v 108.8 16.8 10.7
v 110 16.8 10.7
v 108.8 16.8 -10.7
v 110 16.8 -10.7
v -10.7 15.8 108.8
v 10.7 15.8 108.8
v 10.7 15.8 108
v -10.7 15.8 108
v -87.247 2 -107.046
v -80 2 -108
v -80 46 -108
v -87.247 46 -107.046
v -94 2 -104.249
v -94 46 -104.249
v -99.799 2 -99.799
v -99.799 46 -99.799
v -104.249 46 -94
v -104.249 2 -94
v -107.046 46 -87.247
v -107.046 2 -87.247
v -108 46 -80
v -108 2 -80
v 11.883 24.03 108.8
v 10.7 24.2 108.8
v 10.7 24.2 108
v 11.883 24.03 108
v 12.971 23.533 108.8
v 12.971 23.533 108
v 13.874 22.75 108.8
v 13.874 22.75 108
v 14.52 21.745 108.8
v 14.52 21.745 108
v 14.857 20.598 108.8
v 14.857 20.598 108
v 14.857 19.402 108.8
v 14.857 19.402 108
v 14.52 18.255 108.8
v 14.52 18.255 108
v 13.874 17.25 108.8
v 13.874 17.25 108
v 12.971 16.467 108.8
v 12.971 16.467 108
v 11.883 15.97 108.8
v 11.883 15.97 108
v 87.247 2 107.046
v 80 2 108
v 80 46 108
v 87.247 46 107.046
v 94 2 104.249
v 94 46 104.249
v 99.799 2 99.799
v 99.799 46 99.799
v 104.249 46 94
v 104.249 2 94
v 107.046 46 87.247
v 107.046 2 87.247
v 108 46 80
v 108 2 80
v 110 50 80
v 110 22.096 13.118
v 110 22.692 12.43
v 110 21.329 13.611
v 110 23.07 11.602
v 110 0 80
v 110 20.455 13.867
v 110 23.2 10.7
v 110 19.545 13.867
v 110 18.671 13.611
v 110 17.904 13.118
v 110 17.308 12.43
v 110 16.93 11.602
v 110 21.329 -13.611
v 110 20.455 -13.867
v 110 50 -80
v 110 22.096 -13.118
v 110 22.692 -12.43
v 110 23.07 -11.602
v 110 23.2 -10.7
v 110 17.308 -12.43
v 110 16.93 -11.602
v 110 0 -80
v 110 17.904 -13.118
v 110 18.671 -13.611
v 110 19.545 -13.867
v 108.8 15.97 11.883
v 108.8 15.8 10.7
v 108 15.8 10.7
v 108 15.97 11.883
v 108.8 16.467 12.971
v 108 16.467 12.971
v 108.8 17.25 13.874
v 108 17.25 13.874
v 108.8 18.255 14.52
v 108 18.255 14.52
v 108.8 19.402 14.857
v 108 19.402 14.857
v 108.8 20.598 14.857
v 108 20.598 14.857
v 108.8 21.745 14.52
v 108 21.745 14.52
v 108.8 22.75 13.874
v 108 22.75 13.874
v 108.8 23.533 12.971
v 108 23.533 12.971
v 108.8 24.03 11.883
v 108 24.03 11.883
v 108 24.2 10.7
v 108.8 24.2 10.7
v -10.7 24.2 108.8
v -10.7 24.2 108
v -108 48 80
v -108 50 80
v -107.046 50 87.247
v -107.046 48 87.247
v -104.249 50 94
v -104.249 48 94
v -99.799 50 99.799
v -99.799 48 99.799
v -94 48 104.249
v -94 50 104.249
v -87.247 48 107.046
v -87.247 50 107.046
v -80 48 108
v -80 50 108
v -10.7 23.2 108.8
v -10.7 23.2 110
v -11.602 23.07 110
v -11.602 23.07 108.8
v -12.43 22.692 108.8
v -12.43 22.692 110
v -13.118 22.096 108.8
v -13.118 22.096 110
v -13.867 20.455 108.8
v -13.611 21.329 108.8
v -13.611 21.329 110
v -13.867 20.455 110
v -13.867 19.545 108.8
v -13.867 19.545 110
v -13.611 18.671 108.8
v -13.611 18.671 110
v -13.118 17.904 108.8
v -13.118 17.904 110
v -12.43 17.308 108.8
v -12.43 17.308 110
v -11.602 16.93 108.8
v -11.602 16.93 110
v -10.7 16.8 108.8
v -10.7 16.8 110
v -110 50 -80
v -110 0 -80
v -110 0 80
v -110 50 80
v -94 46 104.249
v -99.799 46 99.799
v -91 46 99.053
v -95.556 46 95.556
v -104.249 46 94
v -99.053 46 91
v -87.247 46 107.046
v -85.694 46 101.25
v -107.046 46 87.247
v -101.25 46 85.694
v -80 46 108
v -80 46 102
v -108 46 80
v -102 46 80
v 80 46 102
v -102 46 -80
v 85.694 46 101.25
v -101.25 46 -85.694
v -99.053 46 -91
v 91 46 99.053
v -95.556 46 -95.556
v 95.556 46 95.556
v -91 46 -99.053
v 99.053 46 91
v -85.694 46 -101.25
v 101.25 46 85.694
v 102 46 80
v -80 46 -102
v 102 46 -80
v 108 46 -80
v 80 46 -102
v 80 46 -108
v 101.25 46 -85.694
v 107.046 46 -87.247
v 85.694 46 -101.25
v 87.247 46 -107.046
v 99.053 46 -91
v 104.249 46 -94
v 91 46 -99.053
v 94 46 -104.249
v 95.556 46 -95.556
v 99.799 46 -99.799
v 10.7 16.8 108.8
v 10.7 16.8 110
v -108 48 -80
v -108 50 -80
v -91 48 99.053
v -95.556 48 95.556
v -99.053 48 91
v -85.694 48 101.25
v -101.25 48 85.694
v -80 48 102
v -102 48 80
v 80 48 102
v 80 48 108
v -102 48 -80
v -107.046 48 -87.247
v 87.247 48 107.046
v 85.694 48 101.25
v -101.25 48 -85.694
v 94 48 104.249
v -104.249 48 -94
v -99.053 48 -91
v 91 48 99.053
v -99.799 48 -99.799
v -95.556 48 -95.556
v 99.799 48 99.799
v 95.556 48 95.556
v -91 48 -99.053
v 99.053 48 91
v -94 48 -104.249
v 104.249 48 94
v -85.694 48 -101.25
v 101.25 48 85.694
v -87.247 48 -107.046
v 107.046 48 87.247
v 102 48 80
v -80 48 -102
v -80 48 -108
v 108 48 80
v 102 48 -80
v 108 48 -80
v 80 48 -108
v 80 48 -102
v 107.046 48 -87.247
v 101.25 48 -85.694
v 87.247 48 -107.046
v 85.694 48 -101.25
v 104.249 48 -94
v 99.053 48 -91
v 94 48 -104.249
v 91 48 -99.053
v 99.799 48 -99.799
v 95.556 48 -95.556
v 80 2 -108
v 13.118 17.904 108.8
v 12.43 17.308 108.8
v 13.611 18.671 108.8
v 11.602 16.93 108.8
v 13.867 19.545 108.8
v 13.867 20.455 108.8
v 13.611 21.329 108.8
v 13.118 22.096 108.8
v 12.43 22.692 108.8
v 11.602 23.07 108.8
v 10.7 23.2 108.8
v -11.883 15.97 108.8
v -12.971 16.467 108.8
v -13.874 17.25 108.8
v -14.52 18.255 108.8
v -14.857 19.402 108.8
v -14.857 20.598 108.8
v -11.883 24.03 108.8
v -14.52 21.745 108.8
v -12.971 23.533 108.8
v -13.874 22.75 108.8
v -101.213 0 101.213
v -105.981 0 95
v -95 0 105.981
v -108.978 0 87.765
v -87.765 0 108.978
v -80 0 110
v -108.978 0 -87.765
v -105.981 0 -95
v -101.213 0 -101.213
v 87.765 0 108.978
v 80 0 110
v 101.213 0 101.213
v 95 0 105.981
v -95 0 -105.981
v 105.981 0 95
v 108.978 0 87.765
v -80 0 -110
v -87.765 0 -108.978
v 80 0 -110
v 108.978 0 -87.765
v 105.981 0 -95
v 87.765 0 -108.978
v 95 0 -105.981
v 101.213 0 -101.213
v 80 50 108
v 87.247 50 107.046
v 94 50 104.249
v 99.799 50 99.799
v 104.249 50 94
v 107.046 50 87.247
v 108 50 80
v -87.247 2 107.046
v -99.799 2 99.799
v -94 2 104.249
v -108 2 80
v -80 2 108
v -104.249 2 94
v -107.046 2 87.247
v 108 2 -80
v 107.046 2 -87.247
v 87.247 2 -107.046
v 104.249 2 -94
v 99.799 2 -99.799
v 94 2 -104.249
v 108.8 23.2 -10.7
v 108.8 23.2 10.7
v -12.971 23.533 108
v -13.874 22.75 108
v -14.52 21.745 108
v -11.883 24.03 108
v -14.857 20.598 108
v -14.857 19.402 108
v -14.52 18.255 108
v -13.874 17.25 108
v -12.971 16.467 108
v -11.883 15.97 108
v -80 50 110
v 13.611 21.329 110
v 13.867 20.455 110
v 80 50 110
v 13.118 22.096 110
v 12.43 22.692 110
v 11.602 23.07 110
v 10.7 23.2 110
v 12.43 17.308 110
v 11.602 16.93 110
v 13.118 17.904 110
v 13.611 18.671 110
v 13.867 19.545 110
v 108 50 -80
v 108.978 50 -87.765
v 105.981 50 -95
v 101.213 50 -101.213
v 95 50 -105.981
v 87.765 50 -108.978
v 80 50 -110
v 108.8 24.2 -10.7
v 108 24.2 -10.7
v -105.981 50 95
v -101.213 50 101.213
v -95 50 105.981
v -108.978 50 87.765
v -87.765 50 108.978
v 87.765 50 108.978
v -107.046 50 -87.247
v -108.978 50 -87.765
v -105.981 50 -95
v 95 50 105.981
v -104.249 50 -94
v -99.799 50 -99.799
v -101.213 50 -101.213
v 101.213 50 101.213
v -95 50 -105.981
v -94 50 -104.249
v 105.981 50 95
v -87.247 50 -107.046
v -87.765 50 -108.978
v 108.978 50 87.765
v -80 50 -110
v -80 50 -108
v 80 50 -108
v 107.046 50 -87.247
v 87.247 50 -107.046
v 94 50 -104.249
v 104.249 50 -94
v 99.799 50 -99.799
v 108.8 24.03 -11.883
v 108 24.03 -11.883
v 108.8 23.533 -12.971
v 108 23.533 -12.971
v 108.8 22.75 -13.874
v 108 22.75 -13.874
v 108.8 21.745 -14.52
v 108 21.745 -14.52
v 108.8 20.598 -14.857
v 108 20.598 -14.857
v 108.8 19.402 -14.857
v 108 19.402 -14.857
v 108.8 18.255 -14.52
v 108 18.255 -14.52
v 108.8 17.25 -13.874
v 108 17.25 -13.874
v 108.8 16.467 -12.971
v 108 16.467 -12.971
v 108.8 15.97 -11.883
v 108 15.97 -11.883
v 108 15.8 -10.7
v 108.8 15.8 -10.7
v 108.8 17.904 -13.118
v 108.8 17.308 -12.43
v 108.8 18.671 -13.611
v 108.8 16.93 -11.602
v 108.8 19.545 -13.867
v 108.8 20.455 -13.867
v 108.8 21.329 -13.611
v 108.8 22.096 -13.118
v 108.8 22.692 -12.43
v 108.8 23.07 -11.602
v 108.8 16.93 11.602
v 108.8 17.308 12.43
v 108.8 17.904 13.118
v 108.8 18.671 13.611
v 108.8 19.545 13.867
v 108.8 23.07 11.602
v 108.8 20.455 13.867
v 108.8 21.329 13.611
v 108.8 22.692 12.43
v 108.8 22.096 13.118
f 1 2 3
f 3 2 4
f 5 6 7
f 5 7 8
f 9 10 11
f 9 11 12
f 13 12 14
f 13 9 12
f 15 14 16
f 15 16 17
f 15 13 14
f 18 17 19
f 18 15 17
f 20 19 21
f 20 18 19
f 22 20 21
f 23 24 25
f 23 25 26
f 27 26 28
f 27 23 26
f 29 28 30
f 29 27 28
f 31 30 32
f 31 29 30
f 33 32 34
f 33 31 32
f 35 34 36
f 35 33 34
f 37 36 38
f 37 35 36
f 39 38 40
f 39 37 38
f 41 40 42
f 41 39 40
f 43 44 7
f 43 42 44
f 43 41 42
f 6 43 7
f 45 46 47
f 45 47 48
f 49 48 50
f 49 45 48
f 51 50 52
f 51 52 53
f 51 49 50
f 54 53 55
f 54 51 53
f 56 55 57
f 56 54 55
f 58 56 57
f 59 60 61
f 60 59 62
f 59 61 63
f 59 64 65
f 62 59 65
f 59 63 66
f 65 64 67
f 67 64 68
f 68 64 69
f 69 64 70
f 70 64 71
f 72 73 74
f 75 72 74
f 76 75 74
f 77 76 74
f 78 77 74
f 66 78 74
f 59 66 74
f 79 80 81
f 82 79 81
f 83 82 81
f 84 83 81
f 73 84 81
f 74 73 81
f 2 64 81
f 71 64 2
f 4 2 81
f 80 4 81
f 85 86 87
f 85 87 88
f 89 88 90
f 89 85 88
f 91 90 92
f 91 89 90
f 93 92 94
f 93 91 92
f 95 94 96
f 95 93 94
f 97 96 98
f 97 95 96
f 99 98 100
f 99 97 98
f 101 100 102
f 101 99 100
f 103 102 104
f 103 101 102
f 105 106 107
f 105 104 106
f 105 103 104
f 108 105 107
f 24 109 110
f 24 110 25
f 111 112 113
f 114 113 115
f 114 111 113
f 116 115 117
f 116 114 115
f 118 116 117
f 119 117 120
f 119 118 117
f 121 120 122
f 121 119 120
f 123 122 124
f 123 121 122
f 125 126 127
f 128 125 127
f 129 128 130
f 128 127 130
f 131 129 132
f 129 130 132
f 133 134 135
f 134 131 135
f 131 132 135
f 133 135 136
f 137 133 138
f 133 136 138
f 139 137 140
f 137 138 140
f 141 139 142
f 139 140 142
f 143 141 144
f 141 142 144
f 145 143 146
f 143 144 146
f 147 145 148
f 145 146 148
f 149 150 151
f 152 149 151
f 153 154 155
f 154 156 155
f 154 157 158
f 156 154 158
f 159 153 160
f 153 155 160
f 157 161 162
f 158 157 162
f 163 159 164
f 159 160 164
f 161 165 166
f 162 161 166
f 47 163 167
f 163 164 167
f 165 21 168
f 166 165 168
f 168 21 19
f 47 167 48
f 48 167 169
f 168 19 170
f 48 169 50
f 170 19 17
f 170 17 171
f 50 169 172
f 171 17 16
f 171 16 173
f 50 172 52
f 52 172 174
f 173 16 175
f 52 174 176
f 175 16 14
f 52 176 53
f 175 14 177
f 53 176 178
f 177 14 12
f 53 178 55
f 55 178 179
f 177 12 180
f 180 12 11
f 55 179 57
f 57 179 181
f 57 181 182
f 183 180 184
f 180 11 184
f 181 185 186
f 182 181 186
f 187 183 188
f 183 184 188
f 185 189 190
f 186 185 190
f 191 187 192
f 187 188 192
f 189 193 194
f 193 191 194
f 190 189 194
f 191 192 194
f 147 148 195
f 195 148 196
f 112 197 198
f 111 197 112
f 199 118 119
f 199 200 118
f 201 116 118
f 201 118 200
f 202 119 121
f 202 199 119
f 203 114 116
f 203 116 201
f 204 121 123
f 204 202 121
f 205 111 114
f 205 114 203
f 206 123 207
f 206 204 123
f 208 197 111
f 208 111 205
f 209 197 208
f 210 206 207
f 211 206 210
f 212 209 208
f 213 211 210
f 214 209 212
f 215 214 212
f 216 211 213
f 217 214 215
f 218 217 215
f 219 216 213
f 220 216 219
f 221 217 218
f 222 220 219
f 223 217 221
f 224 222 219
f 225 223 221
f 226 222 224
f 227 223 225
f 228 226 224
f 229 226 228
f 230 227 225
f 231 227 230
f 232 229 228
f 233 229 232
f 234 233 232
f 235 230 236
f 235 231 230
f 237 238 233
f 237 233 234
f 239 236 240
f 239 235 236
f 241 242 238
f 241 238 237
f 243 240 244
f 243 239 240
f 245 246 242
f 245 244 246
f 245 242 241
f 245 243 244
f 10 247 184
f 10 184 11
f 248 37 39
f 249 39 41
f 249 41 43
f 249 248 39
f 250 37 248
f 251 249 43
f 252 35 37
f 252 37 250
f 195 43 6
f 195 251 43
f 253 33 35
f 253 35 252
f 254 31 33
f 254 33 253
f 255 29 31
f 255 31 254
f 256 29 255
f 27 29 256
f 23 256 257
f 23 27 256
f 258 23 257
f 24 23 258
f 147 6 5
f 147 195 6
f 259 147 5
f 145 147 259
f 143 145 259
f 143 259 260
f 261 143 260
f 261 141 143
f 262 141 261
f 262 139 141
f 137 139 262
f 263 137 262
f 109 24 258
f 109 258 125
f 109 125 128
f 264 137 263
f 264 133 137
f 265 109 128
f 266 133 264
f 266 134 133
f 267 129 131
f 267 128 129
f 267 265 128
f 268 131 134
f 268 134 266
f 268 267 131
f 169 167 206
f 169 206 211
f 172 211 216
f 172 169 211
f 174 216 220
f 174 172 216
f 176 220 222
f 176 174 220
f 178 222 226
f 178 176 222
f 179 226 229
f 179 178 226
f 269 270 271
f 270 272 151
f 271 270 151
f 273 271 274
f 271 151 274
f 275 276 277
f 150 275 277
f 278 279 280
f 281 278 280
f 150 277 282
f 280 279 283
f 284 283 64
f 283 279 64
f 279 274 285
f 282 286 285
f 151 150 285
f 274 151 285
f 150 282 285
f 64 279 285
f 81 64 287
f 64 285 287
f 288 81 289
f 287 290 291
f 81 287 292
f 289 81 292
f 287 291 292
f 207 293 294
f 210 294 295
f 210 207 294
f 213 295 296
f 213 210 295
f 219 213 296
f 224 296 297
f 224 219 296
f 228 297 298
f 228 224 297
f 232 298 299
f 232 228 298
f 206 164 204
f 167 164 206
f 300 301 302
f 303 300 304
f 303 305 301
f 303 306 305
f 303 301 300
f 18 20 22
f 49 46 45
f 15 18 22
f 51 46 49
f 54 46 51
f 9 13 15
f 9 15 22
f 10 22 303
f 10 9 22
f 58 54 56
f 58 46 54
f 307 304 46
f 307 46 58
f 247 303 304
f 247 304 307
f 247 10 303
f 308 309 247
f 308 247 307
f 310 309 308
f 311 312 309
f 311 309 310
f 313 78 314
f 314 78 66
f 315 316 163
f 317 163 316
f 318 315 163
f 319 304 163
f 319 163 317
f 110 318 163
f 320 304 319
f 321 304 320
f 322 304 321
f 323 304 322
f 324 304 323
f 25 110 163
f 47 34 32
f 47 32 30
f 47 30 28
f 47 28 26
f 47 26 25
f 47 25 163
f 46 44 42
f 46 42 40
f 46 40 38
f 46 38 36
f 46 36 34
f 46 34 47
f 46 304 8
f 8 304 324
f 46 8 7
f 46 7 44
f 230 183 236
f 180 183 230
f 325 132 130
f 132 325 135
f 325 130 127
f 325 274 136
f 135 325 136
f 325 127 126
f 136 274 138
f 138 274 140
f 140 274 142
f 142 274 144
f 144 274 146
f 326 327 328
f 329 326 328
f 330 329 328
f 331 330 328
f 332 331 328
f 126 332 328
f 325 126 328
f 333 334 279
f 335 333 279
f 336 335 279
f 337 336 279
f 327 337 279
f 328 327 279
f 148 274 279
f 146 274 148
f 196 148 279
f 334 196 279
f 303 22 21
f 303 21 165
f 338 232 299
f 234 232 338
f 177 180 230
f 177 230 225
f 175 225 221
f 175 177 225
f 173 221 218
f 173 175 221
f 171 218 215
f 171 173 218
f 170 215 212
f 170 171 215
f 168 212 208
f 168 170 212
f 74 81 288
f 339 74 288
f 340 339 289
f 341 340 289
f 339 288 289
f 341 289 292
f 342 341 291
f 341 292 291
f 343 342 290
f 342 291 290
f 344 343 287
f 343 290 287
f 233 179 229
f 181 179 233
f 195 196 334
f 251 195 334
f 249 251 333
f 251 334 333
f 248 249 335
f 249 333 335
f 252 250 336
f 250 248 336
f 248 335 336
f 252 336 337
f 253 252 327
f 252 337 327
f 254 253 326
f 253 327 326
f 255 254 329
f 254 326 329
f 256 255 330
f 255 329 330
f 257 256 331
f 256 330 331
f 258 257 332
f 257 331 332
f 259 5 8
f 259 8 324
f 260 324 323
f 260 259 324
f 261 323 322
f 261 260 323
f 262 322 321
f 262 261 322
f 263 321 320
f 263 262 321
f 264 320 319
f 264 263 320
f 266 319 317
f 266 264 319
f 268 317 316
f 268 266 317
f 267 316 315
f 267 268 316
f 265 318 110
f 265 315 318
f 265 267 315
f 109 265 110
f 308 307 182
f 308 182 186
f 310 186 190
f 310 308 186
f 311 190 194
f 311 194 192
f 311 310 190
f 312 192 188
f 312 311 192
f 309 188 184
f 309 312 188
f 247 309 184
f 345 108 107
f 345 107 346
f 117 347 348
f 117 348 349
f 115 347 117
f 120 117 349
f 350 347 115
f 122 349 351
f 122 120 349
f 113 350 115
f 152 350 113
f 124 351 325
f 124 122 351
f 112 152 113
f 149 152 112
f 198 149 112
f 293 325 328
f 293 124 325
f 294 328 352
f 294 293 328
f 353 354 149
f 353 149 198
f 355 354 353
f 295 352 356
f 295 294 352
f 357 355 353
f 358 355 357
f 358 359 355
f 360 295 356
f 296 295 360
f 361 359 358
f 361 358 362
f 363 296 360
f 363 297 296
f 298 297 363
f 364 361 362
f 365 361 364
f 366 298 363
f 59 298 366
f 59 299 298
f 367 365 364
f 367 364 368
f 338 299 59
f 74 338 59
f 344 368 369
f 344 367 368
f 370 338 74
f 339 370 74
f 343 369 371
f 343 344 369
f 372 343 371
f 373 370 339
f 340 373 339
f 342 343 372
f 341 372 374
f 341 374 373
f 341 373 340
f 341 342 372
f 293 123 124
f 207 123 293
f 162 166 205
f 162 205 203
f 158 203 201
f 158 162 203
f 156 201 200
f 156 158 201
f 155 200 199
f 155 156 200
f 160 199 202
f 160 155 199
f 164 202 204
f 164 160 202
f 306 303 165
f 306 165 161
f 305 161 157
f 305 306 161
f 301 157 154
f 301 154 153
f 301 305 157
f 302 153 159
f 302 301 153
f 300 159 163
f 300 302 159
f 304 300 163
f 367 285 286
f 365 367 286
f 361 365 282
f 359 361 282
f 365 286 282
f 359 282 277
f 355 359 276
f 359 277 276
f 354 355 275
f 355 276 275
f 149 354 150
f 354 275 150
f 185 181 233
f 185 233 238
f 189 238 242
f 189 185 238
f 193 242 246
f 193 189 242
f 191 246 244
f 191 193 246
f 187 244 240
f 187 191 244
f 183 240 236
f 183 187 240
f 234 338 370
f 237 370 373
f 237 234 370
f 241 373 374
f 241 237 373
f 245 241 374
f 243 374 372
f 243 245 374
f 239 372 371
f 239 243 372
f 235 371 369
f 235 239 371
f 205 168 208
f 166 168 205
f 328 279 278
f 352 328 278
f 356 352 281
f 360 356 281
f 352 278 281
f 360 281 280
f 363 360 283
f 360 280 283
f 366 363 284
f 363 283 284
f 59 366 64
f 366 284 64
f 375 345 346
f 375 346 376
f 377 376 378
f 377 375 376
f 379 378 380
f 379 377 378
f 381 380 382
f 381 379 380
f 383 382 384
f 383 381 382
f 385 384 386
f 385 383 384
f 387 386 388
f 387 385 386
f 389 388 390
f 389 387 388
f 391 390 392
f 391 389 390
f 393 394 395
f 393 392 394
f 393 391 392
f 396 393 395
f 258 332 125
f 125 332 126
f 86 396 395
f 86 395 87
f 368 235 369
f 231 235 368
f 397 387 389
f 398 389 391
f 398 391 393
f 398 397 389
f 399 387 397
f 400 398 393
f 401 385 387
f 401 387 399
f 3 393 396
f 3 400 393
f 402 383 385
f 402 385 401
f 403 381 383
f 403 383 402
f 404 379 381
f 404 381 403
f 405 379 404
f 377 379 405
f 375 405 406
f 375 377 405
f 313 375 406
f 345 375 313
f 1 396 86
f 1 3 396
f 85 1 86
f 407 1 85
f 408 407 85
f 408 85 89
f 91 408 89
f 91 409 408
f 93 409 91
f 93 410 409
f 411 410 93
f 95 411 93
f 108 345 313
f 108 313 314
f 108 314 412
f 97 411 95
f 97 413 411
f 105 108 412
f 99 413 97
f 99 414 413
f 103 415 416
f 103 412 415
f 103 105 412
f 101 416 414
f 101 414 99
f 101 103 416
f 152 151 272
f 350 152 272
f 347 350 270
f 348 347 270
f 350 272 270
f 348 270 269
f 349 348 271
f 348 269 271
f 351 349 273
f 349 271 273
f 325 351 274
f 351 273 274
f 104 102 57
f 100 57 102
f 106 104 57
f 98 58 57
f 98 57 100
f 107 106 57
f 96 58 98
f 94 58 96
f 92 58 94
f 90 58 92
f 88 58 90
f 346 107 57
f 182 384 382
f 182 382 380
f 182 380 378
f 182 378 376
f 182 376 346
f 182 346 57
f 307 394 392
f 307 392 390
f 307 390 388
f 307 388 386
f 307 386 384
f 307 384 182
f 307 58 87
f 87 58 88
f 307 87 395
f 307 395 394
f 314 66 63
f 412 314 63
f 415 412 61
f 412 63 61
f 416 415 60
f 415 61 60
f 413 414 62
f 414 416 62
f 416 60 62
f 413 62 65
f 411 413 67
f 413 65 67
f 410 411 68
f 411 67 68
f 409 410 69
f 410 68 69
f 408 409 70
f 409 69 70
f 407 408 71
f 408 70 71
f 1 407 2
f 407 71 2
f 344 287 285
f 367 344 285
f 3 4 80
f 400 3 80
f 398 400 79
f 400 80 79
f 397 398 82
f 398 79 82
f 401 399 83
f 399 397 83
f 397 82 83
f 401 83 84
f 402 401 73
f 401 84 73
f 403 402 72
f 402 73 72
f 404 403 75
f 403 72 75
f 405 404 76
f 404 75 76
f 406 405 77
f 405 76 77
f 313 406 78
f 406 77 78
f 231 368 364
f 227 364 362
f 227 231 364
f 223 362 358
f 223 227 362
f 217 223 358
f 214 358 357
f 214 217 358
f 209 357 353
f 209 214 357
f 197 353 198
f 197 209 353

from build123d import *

# Parameters (mm, degrees)
BOSS_EXTRUDE1_DEPTH = 50
SHELL1_T            = -2
CUT_EXTRUDE2_DEPTH  = 5
CUT_EXTRUDE4_DEPTH  = 5
BOSS_EXTRUDE3_START = 44
BOSS_EXTRUDE3_DEPTH = 2
CUT_EXTRUDE6_REACH  = 254.198
CUT_EXTRUDE6_START  = -1.2
CUT_EXTRUDE7_REACH  = 254.198
CUT_EXTRUDE7_START  = -1.2


with BuildPart() as part:
    # Sketch1 → Boss-Extrude1 (new body)
    with BuildSketch(Plane(origin=(0, 0, 0), x_dir=(1, 0, 0), z_dir=(0, 1, 0))):
        with BuildLine():
            Line((-80, -110), (80, -110))
            ThreePointArc((80, -110), (101.213203436, -101.213203436), (110, -80))
            Line((110, -80), (110, 80))
            ThreePointArc((110, 80), (101.213203436, 101.213203436), (80, 110))
            Line((80, 110), (-80, 110))
            ThreePointArc((-80, 110), (-101.213203436, 101.213203436), (-110, 80))
            Line((-110, 80), (-110, -80))
            ThreePointArc((-110, -80), (-101.213203436, -101.213203436), (-80, -110))
        make_face()
    extrude(amount=BOSS_EXTRUDE1_DEPTH)

    # Shell1
    shell1_openings = [part.faces().sort_by_distance(p)[0] for p in [
        (0, 50, 0),
    ]]
    offset(amount=SHELL1_T, openings=shell1_openings, kind=Kind.INTERSECTION)

    # Sketch5 → Cut-Extrude2 (cut)
    with BuildSketch(Plane(origin=(110, 0, 0), x_dir=(0, 0, -1), z_dir=(1, 0, 0))):
        with BuildLine():
            Line((-10.7, 16.8), (10.7, 16.8))
            ThreePointArc((10.7, 16.8), (13.9, 20), (10.7, 23.2))
            Line((10.7, 23.2), (-10.7, 23.2))
            ThreePointArc((-10.7, 23.2), (-13.9, 20), (-10.7, 16.8))
        make_face()
    extrude(amount=-CUT_EXTRUDE2_DEPTH, mode=Mode.SUBTRACT)

    # Sketch7 → Cut-Extrude4 (cut)
    with BuildSketch(Plane.XY.offset(110)):
        with BuildLine():
            Line((-10.7, 16.8), (10.7, 16.8))
            ThreePointArc((10.7, 16.8), (13.9, 20), (10.7, 23.2))
            Line((10.7, 23.2), (-10.7, 23.2))
            ThreePointArc((-10.7, 23.2), (-13.9, 20), (-10.7, 16.8))
        make_face()
    extrude(amount=-CUT_EXTRUDE4_DEPTH, mode=Mode.SUBTRACT)

    # Sketch8 → Boss-Extrude3 (add)
    with BuildSketch(Plane(origin=(0, 2, 0), x_dir=(1, 0, 0), z_dir=(0, 1, 0)).offset(BOSS_EXTRUDE3_START)):
        with BuildLine():
            Line((80, 108), (-80, 108))
            ThreePointArc((-80, 108), (-99.798989873, 99.798989873), (-108, 80))
            Line((-108, 80), (-108, -80))
            ThreePointArc((-108, -80), (-99.798989873, -99.798989873), (-80, -108))
            Line((-80, -108), (80, -108))
            ThreePointArc((80, -108), (99.798989873, -99.798989873), (108, -80))
            Line((108, -80), (108, 80))
            ThreePointArc((108, 80), (99.798989873, 99.798989873), (80, 108))
        make_face()
        with BuildLine():
            Line((-102, 80), (-102, -80))
            ThreePointArc((-102, -80), (-95.556349186, -95.556349186), (-80, -102))
            Line((-80, -102), (80, -102))
            ThreePointArc((80, -102), (95.556349186, -95.556349186), (102, -80))
            Line((102, -80), (102, 80))
            ThreePointArc((102, 80), (95.556349186, 95.556349186), (80, 102))
            Line((80, 102), (-80, 102))
            ThreePointArc((-80, 102), (-95.556349186, 95.556349186), (-102, 80))
        make_face(mode=Mode.SUBTRACT)
    extrude(amount=BOSS_EXTRUDE3_DEPTH)

    # Sketch5<5> → Cut-Extrude6 (cut, up to next)
    with BuildSketch(Plane(origin=(110, 0, 0), x_dir=(0, 0, -1), z_dir=(1, 0, 0)).offset(CUT_EXTRUDE6_START), mode=Mode.PRIVATE) as cut_extrude6_sk1:
        with BuildLine():
            Line((-10.7, 24.2), (10.7, 24.2))
            ThreePointArc((10.7, 24.2), (14.9, 20), (10.7, 15.8))
            Line((10.7, 15.8), (-10.7, 15.8))
            ThreePointArc((-10.7, 15.8), (-14.9, 20), (-10.7, 24.2))
        make_face()
        with BuildLine():
            Line((-10.7, 23.2), (10.7, 23.2))
            ThreePointArc((10.7, 23.2), (13.9, 20), (10.7, 16.8))
            Line((10.7, 16.8), (-10.7, 16.8))
            ThreePointArc((-10.7, 16.8), (-13.9, 20), (-10.7, 23.2))
        make_face(mode=Mode.SUBTRACT)
    cut_extrude6_tool1 = extrude(cut_extrude6_sk1.sketch, amount=-CUT_EXTRUDE6_REACH, mode=Mode.PRIVATE) & part.part
    add(cut_extrude6_tool1.solids().sort_by_distance((108.8, 20, 14.590387))[0], mode=Mode.SUBTRACT)

    # Sketch7<3> → Cut-Extrude7 (cut, up to next)
    with BuildSketch(Plane.XY.offset(110).offset(CUT_EXTRUDE7_START), mode=Mode.PRIVATE) as cut_extrude7_sk1:
        with BuildLine():
            Line((-10.7, 24.2), (10.7, 24.2))
            ThreePointArc((10.7, 24.2), (14.9, 20), (10.7, 15.8))
            Line((10.7, 15.8), (-10.7, 15.8))
            ThreePointArc((-10.7, 15.8), (-14.9, 20), (-10.7, 24.2))
        make_face()
        with BuildLine():
            Line((-10.7, 23.2), (10.7, 23.2))
            ThreePointArc((10.7, 23.2), (13.9, 20), (10.7, 16.8))
            Line((10.7, 16.8), (-10.7, 16.8))
            ThreePointArc((-10.7, 16.8), (-13.9, 20), (-10.7, 23.2))
        make_face(mode=Mode.SUBTRACT)
    cut_extrude7_tool1 = extrude(cut_extrude7_sk1.sketch, amount=-CUT_EXTRUDE7_REACH, mode=Mode.PRIVATE) & part.part
    add(cut_extrude7_tool1.solids().sort_by_distance((0, 23.890387, 108.8))[0], mode=Mode.SUBTRACT)


solid = part.part
